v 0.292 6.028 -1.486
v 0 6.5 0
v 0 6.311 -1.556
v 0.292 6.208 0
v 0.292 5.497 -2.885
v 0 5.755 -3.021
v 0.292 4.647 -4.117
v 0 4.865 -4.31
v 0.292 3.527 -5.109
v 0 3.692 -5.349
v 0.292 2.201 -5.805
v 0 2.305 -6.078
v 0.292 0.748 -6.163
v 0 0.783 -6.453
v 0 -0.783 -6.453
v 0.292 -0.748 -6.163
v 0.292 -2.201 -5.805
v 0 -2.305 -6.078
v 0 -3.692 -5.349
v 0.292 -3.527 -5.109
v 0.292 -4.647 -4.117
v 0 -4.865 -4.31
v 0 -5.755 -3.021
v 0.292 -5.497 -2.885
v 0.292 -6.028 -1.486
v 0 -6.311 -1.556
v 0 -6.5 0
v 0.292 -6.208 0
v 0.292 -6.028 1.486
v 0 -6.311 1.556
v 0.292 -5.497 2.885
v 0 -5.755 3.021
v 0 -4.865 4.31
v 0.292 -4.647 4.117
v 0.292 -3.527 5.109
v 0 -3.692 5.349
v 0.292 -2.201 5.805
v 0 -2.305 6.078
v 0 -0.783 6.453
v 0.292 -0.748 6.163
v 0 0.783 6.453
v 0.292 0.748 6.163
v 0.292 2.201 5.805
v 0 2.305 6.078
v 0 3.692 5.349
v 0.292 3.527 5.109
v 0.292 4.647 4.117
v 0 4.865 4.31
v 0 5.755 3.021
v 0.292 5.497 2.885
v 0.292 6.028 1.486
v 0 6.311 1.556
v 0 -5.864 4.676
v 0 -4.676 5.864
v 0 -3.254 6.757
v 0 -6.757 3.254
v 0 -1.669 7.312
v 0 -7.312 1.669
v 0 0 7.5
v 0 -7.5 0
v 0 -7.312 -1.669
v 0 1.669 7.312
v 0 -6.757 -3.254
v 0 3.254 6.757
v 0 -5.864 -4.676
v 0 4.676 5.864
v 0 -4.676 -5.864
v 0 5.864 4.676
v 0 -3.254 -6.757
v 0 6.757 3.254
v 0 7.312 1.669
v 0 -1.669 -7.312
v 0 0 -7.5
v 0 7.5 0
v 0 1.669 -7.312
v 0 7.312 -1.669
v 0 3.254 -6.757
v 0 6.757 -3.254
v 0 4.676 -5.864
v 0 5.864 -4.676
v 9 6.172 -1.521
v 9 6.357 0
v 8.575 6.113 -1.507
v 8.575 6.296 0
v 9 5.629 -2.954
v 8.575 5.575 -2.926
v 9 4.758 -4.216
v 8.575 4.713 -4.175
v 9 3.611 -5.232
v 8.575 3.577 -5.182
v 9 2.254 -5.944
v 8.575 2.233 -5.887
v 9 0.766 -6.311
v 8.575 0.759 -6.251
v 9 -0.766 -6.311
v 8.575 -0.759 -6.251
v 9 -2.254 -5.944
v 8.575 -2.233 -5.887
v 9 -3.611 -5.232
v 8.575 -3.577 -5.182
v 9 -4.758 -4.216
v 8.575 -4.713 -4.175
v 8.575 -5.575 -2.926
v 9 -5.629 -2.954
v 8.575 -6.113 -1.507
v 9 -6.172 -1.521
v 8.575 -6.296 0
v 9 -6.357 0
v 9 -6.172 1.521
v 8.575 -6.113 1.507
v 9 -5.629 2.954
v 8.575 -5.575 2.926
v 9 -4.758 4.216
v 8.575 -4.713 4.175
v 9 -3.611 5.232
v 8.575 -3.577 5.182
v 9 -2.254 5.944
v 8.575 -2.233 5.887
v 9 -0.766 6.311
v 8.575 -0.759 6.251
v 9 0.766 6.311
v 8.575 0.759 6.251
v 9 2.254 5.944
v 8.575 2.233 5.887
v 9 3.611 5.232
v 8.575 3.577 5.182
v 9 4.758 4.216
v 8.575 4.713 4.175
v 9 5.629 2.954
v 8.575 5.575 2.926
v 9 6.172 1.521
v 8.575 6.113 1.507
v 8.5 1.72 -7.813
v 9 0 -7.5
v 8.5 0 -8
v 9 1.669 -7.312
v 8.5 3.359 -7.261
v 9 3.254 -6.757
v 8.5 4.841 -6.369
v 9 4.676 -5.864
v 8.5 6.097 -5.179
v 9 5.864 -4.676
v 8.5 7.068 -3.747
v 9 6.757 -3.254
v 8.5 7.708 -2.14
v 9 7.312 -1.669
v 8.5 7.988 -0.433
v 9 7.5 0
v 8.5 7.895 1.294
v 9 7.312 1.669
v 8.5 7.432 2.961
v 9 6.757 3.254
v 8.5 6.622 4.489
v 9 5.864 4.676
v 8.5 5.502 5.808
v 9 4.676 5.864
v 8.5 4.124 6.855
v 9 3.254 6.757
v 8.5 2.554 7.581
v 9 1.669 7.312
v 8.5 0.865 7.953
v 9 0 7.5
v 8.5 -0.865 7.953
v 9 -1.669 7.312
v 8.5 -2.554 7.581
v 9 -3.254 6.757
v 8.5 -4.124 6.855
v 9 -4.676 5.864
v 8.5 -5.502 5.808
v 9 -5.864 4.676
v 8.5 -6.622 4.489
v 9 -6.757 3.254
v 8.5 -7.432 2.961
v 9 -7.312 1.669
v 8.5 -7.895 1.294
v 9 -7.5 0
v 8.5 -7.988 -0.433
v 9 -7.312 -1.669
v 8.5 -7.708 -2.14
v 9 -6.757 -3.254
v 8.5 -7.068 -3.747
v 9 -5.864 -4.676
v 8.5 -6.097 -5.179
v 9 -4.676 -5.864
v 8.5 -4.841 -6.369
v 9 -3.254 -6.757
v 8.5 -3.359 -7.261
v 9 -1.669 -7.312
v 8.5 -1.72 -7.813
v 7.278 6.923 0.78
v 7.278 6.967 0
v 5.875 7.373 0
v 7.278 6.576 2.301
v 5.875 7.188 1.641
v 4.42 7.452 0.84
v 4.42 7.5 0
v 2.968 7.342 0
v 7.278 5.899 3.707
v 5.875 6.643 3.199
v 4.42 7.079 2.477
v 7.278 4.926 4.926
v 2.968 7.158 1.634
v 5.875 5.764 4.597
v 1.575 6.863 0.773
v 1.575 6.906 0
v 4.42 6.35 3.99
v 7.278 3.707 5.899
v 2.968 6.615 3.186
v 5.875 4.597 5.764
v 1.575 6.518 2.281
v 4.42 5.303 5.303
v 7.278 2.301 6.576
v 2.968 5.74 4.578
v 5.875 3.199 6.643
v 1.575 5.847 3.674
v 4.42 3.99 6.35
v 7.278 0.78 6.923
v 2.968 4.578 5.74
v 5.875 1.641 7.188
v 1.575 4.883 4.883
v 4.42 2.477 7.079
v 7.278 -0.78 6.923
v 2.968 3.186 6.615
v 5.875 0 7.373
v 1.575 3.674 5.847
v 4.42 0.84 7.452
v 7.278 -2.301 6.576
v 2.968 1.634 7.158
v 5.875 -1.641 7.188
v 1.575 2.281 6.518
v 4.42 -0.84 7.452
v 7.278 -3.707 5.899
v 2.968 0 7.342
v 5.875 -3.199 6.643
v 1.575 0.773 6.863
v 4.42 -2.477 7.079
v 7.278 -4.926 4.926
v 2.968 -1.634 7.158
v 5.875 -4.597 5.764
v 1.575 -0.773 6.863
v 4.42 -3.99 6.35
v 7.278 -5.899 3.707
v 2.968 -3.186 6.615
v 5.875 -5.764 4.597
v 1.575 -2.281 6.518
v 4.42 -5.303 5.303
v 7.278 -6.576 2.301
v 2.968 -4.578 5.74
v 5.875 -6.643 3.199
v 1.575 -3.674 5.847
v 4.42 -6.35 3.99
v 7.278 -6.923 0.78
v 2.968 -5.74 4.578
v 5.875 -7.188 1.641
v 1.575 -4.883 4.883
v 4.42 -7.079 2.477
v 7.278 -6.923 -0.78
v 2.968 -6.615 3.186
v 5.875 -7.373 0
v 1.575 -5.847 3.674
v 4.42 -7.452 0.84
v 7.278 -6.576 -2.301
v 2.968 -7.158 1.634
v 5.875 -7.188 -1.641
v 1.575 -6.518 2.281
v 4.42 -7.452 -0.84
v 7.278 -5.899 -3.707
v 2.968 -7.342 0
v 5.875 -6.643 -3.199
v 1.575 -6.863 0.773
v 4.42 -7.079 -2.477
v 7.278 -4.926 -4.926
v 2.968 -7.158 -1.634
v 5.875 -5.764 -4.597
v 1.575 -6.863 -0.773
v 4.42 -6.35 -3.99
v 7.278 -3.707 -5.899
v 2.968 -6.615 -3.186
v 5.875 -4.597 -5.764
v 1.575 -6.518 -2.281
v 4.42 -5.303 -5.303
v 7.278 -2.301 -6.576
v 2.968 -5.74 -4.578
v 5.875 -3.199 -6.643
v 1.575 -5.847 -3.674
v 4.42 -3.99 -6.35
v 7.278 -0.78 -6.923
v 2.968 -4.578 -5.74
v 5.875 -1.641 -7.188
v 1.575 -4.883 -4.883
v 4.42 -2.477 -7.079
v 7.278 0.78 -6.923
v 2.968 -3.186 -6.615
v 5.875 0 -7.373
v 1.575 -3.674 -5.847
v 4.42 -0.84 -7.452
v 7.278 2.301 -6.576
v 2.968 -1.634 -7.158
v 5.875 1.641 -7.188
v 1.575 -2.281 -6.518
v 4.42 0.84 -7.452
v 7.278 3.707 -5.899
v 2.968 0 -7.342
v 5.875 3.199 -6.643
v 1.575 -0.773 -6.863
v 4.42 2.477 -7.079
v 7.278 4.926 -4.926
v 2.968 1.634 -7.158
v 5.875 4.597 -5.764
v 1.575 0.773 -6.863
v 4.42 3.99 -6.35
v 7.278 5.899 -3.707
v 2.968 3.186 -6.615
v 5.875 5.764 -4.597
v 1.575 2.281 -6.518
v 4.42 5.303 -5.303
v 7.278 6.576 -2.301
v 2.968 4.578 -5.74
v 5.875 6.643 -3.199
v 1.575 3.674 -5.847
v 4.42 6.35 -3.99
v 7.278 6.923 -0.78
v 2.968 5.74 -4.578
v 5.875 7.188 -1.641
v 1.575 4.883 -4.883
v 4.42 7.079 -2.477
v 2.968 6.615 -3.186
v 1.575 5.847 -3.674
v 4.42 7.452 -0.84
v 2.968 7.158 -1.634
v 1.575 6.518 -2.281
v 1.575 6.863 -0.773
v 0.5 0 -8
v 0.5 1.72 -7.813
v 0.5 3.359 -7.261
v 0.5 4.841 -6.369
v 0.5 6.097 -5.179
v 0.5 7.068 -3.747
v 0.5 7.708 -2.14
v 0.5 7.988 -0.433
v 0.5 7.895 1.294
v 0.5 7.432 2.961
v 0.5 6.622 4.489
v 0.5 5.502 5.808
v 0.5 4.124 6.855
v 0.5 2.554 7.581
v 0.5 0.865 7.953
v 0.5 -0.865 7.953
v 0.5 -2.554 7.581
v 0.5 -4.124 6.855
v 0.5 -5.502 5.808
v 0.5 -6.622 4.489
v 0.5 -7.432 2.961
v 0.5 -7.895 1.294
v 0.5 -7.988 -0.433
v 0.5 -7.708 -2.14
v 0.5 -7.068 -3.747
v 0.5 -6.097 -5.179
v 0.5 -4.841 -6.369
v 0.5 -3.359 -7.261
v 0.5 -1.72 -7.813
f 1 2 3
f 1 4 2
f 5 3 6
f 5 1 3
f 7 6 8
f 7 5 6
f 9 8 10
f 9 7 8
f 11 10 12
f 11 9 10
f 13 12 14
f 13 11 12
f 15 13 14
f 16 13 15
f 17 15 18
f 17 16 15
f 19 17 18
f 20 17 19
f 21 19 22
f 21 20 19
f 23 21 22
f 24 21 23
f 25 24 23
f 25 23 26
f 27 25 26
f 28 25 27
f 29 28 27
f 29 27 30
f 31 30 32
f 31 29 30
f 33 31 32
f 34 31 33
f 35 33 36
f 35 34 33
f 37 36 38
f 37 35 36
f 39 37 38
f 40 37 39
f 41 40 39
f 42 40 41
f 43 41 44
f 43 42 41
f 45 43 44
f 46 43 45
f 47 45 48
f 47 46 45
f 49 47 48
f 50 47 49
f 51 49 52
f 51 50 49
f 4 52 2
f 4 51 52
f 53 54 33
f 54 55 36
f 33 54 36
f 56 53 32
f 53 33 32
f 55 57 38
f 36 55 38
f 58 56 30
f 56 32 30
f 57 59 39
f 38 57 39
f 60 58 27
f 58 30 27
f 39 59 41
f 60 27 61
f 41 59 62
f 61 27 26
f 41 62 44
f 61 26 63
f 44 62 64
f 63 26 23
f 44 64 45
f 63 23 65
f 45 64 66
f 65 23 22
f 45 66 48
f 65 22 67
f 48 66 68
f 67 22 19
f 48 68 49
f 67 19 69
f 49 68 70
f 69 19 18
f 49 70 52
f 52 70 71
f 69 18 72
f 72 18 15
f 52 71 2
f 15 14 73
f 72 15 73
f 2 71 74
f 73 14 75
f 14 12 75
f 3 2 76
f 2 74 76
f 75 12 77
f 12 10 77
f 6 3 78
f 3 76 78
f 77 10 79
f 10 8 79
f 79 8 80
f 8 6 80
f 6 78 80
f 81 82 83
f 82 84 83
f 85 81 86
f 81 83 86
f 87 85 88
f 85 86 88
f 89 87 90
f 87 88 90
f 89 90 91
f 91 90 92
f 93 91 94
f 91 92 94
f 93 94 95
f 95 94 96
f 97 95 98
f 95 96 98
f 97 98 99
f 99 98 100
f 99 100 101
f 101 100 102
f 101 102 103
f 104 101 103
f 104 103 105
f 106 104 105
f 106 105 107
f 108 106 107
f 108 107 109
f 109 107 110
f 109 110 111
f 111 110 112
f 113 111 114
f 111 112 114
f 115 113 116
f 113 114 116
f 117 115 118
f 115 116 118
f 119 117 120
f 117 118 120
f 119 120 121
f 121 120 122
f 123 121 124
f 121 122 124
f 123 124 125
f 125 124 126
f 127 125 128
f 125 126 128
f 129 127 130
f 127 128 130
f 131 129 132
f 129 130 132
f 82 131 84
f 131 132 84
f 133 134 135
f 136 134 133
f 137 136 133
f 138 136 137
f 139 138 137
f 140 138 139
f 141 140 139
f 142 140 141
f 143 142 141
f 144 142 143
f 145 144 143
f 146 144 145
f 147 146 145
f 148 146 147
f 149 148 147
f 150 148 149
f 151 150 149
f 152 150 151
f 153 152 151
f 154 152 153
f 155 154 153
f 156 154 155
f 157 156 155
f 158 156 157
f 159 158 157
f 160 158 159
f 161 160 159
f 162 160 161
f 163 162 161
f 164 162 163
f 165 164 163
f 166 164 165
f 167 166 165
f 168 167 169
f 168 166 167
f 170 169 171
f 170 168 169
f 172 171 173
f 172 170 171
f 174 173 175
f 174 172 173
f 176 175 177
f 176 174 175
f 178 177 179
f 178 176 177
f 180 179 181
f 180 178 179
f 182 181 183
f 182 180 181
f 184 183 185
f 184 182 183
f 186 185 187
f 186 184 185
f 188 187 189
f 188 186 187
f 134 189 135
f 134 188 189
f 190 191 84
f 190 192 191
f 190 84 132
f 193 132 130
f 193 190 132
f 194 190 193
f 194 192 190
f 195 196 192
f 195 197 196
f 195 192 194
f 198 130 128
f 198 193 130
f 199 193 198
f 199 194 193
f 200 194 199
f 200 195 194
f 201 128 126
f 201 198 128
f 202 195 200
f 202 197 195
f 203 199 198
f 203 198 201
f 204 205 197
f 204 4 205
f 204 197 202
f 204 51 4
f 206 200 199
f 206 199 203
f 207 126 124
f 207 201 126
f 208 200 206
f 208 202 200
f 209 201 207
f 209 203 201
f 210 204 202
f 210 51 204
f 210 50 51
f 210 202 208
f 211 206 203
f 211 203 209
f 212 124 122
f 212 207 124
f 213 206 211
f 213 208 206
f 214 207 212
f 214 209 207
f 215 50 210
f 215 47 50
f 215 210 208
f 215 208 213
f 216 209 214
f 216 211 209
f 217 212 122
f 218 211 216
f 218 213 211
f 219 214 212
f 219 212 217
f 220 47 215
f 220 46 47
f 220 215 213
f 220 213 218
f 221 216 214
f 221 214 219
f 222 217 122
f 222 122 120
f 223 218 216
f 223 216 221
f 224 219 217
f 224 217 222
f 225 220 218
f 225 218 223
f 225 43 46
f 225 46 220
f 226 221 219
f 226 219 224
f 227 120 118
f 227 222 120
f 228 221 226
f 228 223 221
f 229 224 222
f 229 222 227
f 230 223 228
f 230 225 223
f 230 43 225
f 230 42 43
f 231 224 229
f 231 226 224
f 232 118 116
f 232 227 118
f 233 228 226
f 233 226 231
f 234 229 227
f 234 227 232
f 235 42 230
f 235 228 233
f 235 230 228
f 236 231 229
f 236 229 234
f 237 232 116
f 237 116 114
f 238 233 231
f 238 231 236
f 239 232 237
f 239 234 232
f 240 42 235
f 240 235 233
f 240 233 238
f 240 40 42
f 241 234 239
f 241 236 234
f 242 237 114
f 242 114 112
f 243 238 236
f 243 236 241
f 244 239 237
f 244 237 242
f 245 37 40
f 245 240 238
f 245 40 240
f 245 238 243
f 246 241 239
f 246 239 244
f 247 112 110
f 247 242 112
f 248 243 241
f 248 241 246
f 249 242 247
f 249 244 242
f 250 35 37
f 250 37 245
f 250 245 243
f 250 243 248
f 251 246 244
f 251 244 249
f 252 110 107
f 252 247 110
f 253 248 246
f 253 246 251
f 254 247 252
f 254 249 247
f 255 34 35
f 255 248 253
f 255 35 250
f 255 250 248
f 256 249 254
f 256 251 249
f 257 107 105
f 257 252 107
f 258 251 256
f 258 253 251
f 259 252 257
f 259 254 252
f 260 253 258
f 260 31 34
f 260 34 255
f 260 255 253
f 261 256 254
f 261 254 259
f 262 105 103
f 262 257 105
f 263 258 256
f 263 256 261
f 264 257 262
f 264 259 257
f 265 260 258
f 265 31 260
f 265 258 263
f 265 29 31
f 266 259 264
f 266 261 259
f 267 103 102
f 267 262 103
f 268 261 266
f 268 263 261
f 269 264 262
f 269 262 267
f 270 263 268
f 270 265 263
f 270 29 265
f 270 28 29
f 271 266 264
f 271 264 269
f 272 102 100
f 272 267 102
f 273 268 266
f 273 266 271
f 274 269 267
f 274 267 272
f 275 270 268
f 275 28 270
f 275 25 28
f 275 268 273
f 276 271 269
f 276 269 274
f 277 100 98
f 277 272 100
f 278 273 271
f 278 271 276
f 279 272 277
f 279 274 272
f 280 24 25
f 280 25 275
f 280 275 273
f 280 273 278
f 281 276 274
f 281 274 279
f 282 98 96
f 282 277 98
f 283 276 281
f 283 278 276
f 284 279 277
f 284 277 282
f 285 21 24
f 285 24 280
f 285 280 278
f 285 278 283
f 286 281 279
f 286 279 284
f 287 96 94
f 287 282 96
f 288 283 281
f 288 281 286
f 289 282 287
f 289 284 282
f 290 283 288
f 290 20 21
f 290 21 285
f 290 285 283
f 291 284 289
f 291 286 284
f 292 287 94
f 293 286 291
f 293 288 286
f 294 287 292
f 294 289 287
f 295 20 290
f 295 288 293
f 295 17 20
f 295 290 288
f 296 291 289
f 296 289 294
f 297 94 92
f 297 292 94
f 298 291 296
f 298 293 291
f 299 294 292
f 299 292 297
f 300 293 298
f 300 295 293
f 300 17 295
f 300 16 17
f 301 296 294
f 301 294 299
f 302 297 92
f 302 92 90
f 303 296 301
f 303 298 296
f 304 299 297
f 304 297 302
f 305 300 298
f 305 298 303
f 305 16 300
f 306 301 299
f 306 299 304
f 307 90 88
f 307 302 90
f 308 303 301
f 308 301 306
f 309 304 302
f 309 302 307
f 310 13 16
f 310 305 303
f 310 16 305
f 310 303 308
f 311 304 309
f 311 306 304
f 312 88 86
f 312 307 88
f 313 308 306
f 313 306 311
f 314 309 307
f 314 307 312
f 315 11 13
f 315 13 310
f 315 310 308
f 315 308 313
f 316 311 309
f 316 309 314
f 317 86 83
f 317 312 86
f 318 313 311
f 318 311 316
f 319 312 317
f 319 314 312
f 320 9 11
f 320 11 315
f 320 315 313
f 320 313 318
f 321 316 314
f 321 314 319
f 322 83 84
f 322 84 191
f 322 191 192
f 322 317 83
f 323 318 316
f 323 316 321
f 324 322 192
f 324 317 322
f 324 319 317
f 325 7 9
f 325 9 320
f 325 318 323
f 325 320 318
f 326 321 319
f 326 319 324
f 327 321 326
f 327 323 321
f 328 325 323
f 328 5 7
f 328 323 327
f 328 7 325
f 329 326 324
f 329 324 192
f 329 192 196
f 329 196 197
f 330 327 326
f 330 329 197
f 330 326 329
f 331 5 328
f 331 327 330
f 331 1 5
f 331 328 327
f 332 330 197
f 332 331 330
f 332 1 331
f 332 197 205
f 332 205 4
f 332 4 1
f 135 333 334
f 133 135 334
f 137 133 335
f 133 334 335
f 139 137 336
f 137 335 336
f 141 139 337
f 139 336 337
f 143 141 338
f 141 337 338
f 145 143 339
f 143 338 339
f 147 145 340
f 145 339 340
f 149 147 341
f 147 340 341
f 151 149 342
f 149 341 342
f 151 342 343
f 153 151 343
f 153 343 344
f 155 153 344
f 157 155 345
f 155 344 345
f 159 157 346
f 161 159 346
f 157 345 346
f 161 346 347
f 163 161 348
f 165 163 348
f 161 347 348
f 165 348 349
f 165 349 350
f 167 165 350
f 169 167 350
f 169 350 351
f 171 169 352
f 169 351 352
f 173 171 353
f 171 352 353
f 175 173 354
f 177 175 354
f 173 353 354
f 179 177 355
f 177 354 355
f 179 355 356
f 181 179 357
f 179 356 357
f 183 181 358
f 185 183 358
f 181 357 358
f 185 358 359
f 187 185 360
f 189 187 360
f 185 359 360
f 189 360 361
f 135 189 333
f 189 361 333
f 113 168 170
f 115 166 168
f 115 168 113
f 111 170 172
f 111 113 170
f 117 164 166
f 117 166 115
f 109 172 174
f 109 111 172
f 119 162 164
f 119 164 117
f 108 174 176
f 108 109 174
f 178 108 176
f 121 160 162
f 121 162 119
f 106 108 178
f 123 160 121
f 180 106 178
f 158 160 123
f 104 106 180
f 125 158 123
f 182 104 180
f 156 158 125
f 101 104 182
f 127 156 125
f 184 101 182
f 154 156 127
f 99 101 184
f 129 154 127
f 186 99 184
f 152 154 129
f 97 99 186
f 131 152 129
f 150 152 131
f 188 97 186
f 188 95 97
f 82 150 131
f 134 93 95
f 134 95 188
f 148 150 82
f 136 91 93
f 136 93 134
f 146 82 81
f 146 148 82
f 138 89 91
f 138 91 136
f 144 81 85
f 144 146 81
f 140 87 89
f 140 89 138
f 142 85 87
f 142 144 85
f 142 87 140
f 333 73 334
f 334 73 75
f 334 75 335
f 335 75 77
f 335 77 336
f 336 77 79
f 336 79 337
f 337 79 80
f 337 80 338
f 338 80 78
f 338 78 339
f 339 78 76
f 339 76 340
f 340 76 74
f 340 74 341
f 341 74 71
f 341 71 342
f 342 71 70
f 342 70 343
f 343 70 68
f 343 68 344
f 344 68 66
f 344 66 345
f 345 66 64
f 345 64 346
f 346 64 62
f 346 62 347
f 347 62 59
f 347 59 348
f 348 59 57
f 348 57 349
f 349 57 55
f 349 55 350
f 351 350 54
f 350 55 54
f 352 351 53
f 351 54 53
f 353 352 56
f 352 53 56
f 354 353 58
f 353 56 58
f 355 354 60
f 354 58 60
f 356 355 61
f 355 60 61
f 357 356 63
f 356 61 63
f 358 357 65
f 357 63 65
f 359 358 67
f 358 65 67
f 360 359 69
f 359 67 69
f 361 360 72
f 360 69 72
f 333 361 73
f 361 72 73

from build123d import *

# Parameters (mm, degrees)
SKETCH_1_R       = 8
EXTRUDE_1_DEPTH  = 9
CHAMFER_1_SIZE   = 0.357142857
CHAMFER_1_SIZE_2 = 0.5
CHAMFER_2_SIZE   = 0.5


with BuildPart() as part:
    # Эскиз1 → Бобышка-Вытянуть1 (new body)
    with BuildSketch(Plane(origin=(0, 0, 0), x_dir=(0, 0, -1), z_dir=(1, 0, 0))):
        Circle(SKETCH_1_R)
    extrude(amount=EXTRUDE_1_DEPTH)

    # Эскиз2 → Вырез-Повернуть1 (revolve, cut)
    with BuildSketch(Plane.XY):
        with BuildLine():
            Line((-3, 0), (12, 0))
            ThreePointArc((12, 0), (4.5, 7.5), (-3, 0))
        make_face()
    revolve(axis=Axis((0, 0, 0), (1, 0, 0)), mode=Mode.SUBTRACT)

    # Фаска1
    # the kernel refuses this chamfer: 0.5, 0.357142857 mm, written as the material it takes off along each edge
    with BuildSketch(Plane(origin=(9, 0, 0), x_dir=(0, 1, 0), z_dir=(0, 0, 1))) as chamfer_1_piece_1:
        with BuildLine():
            Line((6 + CHAMFER_1_SIZE, 0), (6.296419414, 0.425064103))
            ThreePointArc((6.296419414, 0.425064103), (6.1560674, 0.215979206), (6, 0))
            Line((6, 0), (6 + CHAMFER_1_SIZE, 0))
        make_face()
    revolve(axis=Axis((9, 0, 0), (-1, 0, 0)), mode=Mode.SUBTRACT)
    with BuildSketch(Plane(origin=(0, 0, 0), x_dir=(0, 1, 0), z_dir=(0, 0, 1))) as chamfer_1_piece_2:
        with BuildLine():
            Line((6 + CHAMFER_1_SIZE_2, 0), (6.208166664, -0.291833336))
            ThreePointArc((6.208166664, -0.291833336), (6.10678692, -0.146018659), (6, 0))
            Line((6, 0), (6 + CHAMFER_1_SIZE_2, 0))
        make_face()
    revolve(axis=Axis((0, 0, 0), (-1, 0, 0)), mode=Mode.SUBTRACT)

    # Фаска2
    chamfer_2_edges = [part.edges().sort_by_distance(p)[0] for p in [
        (0, 0, 8),
        (9, 0, 8),
    ]]
    chamfer(chamfer_2_edges, length=CHAMFER_2_SIZE)


solid = part.part
